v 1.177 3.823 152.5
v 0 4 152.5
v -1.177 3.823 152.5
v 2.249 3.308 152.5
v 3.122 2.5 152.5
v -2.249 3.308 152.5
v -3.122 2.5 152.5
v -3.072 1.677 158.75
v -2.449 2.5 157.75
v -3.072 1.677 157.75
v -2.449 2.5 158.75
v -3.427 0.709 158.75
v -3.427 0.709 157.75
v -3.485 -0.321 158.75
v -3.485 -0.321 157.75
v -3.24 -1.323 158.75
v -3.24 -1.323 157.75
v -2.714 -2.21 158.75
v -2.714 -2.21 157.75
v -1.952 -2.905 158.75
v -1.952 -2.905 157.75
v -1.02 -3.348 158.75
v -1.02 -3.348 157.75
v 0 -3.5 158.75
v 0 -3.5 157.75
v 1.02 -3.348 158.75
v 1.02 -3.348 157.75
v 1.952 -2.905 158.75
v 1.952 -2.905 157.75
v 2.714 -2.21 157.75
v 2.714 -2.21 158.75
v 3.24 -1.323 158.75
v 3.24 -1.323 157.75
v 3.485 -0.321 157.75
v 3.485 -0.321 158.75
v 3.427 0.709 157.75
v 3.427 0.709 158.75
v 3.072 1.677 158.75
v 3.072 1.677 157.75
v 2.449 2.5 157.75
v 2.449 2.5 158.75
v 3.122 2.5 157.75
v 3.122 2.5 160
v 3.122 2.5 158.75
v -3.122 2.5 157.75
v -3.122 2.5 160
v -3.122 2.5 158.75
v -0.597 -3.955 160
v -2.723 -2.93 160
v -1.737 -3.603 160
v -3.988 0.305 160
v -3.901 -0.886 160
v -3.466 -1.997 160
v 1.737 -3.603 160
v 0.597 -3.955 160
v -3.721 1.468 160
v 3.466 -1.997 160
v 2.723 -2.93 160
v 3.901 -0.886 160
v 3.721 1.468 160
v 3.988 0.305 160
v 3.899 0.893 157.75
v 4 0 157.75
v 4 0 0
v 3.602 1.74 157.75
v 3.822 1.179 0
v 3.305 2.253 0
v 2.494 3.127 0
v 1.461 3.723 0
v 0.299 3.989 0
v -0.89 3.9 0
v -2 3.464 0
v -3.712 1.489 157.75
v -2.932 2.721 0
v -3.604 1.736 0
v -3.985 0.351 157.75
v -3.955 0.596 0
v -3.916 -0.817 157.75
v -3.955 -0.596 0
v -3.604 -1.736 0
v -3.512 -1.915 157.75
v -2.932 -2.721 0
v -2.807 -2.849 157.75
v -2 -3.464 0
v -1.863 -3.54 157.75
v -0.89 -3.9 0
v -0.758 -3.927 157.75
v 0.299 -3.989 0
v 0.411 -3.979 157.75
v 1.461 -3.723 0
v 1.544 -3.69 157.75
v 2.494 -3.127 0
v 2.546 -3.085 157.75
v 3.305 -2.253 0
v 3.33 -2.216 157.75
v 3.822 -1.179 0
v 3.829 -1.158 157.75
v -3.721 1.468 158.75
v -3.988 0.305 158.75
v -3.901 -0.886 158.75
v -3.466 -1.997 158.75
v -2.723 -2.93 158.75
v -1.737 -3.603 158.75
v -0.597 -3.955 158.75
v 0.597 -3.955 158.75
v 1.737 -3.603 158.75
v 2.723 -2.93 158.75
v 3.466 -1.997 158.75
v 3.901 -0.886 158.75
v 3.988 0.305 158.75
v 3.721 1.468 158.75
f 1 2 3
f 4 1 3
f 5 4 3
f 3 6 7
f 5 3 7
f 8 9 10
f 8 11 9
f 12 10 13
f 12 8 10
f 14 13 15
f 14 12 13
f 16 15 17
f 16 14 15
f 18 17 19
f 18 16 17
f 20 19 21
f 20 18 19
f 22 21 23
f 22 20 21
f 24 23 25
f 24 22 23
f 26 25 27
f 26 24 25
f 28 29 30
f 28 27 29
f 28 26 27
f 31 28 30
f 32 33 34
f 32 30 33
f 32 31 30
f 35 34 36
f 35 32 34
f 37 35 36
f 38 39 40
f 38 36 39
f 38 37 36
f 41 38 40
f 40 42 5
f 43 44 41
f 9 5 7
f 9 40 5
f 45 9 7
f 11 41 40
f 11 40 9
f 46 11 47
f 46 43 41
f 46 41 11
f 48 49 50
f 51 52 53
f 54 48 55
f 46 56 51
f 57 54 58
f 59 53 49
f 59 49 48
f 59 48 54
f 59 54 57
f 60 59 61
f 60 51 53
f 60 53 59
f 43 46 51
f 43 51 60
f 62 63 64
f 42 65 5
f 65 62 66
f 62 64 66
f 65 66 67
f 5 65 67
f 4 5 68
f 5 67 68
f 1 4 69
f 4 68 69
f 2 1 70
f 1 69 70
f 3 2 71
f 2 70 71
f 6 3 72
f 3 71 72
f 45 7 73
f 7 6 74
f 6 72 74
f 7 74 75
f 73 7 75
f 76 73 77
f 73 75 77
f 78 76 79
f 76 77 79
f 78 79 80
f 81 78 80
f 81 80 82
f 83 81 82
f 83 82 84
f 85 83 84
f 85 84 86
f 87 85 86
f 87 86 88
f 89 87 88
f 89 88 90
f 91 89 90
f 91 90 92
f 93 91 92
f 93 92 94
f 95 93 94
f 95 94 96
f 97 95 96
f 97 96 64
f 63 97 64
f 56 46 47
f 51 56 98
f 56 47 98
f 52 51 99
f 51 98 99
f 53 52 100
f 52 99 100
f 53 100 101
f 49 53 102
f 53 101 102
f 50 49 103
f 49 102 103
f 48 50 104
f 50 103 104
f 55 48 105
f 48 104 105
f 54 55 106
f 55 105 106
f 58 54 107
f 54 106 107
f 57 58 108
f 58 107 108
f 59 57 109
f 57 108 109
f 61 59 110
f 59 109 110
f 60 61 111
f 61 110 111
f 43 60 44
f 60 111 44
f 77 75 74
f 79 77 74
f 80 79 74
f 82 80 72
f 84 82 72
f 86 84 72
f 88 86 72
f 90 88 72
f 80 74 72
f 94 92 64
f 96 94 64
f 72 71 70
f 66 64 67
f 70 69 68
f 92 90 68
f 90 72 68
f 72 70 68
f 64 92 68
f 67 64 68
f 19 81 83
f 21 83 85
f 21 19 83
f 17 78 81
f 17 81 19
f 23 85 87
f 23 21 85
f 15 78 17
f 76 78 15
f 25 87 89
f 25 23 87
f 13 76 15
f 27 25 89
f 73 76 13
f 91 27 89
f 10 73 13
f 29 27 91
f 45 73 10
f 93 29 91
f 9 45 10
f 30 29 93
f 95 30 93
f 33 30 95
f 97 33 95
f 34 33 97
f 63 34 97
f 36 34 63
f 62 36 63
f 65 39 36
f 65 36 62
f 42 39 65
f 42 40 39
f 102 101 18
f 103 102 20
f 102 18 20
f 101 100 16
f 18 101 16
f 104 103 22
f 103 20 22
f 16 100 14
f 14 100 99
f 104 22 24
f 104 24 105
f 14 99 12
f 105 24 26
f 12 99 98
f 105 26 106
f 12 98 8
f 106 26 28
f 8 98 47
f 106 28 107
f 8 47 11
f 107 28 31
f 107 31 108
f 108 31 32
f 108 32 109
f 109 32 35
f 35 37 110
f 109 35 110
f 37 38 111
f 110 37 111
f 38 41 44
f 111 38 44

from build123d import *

# Parameters (mm, degrees)
SKETCH1_R           = 4
BOSS_EXTRUDE1_DEPTH = 160
CUT_EXTRUDE1_DEPTH  = 7.5
SKETCH3_R           = 4
SKETCH3_R_2         = 3.5
CUT_EXTRUDE2_DEPTH  = 1


with BuildPart() as part:
    # Sketch1 → Boss-Extrude1 (new body)
    with BuildSketch(Plane.XY):
        Circle(SKETCH1_R)
    extrude(amount=BOSS_EXTRUDE1_DEPTH)

    # Sketch2 → Cut-Extrude1 (cut)
    with BuildSketch(Plane.XY.offset(160)):
        with BuildLine():
            Line((3.122498999, 2.5), (-3.122498999, 2.5))
            ThreePointArc((-3.122498999, 2.5), (0, 4), (3.122498999, 2.5))
        make_face()
    extrude(amount=-CUT_EXTRUDE1_DEPTH, mode=Mode.SUBTRACT)

    # Sketch3 → Cut-Extrude2 (cut)
    with BuildSketch(Plane.XY.offset(158.75)):
        Circle(SKETCH3_R)
        Circle(SKETCH3_R_2, mode=Mode.SUBTRACT)
    extrude(amount=-CUT_EXTRUDE2_DEPTH, mode=Mode.SUBTRACT)


solid = part.part
